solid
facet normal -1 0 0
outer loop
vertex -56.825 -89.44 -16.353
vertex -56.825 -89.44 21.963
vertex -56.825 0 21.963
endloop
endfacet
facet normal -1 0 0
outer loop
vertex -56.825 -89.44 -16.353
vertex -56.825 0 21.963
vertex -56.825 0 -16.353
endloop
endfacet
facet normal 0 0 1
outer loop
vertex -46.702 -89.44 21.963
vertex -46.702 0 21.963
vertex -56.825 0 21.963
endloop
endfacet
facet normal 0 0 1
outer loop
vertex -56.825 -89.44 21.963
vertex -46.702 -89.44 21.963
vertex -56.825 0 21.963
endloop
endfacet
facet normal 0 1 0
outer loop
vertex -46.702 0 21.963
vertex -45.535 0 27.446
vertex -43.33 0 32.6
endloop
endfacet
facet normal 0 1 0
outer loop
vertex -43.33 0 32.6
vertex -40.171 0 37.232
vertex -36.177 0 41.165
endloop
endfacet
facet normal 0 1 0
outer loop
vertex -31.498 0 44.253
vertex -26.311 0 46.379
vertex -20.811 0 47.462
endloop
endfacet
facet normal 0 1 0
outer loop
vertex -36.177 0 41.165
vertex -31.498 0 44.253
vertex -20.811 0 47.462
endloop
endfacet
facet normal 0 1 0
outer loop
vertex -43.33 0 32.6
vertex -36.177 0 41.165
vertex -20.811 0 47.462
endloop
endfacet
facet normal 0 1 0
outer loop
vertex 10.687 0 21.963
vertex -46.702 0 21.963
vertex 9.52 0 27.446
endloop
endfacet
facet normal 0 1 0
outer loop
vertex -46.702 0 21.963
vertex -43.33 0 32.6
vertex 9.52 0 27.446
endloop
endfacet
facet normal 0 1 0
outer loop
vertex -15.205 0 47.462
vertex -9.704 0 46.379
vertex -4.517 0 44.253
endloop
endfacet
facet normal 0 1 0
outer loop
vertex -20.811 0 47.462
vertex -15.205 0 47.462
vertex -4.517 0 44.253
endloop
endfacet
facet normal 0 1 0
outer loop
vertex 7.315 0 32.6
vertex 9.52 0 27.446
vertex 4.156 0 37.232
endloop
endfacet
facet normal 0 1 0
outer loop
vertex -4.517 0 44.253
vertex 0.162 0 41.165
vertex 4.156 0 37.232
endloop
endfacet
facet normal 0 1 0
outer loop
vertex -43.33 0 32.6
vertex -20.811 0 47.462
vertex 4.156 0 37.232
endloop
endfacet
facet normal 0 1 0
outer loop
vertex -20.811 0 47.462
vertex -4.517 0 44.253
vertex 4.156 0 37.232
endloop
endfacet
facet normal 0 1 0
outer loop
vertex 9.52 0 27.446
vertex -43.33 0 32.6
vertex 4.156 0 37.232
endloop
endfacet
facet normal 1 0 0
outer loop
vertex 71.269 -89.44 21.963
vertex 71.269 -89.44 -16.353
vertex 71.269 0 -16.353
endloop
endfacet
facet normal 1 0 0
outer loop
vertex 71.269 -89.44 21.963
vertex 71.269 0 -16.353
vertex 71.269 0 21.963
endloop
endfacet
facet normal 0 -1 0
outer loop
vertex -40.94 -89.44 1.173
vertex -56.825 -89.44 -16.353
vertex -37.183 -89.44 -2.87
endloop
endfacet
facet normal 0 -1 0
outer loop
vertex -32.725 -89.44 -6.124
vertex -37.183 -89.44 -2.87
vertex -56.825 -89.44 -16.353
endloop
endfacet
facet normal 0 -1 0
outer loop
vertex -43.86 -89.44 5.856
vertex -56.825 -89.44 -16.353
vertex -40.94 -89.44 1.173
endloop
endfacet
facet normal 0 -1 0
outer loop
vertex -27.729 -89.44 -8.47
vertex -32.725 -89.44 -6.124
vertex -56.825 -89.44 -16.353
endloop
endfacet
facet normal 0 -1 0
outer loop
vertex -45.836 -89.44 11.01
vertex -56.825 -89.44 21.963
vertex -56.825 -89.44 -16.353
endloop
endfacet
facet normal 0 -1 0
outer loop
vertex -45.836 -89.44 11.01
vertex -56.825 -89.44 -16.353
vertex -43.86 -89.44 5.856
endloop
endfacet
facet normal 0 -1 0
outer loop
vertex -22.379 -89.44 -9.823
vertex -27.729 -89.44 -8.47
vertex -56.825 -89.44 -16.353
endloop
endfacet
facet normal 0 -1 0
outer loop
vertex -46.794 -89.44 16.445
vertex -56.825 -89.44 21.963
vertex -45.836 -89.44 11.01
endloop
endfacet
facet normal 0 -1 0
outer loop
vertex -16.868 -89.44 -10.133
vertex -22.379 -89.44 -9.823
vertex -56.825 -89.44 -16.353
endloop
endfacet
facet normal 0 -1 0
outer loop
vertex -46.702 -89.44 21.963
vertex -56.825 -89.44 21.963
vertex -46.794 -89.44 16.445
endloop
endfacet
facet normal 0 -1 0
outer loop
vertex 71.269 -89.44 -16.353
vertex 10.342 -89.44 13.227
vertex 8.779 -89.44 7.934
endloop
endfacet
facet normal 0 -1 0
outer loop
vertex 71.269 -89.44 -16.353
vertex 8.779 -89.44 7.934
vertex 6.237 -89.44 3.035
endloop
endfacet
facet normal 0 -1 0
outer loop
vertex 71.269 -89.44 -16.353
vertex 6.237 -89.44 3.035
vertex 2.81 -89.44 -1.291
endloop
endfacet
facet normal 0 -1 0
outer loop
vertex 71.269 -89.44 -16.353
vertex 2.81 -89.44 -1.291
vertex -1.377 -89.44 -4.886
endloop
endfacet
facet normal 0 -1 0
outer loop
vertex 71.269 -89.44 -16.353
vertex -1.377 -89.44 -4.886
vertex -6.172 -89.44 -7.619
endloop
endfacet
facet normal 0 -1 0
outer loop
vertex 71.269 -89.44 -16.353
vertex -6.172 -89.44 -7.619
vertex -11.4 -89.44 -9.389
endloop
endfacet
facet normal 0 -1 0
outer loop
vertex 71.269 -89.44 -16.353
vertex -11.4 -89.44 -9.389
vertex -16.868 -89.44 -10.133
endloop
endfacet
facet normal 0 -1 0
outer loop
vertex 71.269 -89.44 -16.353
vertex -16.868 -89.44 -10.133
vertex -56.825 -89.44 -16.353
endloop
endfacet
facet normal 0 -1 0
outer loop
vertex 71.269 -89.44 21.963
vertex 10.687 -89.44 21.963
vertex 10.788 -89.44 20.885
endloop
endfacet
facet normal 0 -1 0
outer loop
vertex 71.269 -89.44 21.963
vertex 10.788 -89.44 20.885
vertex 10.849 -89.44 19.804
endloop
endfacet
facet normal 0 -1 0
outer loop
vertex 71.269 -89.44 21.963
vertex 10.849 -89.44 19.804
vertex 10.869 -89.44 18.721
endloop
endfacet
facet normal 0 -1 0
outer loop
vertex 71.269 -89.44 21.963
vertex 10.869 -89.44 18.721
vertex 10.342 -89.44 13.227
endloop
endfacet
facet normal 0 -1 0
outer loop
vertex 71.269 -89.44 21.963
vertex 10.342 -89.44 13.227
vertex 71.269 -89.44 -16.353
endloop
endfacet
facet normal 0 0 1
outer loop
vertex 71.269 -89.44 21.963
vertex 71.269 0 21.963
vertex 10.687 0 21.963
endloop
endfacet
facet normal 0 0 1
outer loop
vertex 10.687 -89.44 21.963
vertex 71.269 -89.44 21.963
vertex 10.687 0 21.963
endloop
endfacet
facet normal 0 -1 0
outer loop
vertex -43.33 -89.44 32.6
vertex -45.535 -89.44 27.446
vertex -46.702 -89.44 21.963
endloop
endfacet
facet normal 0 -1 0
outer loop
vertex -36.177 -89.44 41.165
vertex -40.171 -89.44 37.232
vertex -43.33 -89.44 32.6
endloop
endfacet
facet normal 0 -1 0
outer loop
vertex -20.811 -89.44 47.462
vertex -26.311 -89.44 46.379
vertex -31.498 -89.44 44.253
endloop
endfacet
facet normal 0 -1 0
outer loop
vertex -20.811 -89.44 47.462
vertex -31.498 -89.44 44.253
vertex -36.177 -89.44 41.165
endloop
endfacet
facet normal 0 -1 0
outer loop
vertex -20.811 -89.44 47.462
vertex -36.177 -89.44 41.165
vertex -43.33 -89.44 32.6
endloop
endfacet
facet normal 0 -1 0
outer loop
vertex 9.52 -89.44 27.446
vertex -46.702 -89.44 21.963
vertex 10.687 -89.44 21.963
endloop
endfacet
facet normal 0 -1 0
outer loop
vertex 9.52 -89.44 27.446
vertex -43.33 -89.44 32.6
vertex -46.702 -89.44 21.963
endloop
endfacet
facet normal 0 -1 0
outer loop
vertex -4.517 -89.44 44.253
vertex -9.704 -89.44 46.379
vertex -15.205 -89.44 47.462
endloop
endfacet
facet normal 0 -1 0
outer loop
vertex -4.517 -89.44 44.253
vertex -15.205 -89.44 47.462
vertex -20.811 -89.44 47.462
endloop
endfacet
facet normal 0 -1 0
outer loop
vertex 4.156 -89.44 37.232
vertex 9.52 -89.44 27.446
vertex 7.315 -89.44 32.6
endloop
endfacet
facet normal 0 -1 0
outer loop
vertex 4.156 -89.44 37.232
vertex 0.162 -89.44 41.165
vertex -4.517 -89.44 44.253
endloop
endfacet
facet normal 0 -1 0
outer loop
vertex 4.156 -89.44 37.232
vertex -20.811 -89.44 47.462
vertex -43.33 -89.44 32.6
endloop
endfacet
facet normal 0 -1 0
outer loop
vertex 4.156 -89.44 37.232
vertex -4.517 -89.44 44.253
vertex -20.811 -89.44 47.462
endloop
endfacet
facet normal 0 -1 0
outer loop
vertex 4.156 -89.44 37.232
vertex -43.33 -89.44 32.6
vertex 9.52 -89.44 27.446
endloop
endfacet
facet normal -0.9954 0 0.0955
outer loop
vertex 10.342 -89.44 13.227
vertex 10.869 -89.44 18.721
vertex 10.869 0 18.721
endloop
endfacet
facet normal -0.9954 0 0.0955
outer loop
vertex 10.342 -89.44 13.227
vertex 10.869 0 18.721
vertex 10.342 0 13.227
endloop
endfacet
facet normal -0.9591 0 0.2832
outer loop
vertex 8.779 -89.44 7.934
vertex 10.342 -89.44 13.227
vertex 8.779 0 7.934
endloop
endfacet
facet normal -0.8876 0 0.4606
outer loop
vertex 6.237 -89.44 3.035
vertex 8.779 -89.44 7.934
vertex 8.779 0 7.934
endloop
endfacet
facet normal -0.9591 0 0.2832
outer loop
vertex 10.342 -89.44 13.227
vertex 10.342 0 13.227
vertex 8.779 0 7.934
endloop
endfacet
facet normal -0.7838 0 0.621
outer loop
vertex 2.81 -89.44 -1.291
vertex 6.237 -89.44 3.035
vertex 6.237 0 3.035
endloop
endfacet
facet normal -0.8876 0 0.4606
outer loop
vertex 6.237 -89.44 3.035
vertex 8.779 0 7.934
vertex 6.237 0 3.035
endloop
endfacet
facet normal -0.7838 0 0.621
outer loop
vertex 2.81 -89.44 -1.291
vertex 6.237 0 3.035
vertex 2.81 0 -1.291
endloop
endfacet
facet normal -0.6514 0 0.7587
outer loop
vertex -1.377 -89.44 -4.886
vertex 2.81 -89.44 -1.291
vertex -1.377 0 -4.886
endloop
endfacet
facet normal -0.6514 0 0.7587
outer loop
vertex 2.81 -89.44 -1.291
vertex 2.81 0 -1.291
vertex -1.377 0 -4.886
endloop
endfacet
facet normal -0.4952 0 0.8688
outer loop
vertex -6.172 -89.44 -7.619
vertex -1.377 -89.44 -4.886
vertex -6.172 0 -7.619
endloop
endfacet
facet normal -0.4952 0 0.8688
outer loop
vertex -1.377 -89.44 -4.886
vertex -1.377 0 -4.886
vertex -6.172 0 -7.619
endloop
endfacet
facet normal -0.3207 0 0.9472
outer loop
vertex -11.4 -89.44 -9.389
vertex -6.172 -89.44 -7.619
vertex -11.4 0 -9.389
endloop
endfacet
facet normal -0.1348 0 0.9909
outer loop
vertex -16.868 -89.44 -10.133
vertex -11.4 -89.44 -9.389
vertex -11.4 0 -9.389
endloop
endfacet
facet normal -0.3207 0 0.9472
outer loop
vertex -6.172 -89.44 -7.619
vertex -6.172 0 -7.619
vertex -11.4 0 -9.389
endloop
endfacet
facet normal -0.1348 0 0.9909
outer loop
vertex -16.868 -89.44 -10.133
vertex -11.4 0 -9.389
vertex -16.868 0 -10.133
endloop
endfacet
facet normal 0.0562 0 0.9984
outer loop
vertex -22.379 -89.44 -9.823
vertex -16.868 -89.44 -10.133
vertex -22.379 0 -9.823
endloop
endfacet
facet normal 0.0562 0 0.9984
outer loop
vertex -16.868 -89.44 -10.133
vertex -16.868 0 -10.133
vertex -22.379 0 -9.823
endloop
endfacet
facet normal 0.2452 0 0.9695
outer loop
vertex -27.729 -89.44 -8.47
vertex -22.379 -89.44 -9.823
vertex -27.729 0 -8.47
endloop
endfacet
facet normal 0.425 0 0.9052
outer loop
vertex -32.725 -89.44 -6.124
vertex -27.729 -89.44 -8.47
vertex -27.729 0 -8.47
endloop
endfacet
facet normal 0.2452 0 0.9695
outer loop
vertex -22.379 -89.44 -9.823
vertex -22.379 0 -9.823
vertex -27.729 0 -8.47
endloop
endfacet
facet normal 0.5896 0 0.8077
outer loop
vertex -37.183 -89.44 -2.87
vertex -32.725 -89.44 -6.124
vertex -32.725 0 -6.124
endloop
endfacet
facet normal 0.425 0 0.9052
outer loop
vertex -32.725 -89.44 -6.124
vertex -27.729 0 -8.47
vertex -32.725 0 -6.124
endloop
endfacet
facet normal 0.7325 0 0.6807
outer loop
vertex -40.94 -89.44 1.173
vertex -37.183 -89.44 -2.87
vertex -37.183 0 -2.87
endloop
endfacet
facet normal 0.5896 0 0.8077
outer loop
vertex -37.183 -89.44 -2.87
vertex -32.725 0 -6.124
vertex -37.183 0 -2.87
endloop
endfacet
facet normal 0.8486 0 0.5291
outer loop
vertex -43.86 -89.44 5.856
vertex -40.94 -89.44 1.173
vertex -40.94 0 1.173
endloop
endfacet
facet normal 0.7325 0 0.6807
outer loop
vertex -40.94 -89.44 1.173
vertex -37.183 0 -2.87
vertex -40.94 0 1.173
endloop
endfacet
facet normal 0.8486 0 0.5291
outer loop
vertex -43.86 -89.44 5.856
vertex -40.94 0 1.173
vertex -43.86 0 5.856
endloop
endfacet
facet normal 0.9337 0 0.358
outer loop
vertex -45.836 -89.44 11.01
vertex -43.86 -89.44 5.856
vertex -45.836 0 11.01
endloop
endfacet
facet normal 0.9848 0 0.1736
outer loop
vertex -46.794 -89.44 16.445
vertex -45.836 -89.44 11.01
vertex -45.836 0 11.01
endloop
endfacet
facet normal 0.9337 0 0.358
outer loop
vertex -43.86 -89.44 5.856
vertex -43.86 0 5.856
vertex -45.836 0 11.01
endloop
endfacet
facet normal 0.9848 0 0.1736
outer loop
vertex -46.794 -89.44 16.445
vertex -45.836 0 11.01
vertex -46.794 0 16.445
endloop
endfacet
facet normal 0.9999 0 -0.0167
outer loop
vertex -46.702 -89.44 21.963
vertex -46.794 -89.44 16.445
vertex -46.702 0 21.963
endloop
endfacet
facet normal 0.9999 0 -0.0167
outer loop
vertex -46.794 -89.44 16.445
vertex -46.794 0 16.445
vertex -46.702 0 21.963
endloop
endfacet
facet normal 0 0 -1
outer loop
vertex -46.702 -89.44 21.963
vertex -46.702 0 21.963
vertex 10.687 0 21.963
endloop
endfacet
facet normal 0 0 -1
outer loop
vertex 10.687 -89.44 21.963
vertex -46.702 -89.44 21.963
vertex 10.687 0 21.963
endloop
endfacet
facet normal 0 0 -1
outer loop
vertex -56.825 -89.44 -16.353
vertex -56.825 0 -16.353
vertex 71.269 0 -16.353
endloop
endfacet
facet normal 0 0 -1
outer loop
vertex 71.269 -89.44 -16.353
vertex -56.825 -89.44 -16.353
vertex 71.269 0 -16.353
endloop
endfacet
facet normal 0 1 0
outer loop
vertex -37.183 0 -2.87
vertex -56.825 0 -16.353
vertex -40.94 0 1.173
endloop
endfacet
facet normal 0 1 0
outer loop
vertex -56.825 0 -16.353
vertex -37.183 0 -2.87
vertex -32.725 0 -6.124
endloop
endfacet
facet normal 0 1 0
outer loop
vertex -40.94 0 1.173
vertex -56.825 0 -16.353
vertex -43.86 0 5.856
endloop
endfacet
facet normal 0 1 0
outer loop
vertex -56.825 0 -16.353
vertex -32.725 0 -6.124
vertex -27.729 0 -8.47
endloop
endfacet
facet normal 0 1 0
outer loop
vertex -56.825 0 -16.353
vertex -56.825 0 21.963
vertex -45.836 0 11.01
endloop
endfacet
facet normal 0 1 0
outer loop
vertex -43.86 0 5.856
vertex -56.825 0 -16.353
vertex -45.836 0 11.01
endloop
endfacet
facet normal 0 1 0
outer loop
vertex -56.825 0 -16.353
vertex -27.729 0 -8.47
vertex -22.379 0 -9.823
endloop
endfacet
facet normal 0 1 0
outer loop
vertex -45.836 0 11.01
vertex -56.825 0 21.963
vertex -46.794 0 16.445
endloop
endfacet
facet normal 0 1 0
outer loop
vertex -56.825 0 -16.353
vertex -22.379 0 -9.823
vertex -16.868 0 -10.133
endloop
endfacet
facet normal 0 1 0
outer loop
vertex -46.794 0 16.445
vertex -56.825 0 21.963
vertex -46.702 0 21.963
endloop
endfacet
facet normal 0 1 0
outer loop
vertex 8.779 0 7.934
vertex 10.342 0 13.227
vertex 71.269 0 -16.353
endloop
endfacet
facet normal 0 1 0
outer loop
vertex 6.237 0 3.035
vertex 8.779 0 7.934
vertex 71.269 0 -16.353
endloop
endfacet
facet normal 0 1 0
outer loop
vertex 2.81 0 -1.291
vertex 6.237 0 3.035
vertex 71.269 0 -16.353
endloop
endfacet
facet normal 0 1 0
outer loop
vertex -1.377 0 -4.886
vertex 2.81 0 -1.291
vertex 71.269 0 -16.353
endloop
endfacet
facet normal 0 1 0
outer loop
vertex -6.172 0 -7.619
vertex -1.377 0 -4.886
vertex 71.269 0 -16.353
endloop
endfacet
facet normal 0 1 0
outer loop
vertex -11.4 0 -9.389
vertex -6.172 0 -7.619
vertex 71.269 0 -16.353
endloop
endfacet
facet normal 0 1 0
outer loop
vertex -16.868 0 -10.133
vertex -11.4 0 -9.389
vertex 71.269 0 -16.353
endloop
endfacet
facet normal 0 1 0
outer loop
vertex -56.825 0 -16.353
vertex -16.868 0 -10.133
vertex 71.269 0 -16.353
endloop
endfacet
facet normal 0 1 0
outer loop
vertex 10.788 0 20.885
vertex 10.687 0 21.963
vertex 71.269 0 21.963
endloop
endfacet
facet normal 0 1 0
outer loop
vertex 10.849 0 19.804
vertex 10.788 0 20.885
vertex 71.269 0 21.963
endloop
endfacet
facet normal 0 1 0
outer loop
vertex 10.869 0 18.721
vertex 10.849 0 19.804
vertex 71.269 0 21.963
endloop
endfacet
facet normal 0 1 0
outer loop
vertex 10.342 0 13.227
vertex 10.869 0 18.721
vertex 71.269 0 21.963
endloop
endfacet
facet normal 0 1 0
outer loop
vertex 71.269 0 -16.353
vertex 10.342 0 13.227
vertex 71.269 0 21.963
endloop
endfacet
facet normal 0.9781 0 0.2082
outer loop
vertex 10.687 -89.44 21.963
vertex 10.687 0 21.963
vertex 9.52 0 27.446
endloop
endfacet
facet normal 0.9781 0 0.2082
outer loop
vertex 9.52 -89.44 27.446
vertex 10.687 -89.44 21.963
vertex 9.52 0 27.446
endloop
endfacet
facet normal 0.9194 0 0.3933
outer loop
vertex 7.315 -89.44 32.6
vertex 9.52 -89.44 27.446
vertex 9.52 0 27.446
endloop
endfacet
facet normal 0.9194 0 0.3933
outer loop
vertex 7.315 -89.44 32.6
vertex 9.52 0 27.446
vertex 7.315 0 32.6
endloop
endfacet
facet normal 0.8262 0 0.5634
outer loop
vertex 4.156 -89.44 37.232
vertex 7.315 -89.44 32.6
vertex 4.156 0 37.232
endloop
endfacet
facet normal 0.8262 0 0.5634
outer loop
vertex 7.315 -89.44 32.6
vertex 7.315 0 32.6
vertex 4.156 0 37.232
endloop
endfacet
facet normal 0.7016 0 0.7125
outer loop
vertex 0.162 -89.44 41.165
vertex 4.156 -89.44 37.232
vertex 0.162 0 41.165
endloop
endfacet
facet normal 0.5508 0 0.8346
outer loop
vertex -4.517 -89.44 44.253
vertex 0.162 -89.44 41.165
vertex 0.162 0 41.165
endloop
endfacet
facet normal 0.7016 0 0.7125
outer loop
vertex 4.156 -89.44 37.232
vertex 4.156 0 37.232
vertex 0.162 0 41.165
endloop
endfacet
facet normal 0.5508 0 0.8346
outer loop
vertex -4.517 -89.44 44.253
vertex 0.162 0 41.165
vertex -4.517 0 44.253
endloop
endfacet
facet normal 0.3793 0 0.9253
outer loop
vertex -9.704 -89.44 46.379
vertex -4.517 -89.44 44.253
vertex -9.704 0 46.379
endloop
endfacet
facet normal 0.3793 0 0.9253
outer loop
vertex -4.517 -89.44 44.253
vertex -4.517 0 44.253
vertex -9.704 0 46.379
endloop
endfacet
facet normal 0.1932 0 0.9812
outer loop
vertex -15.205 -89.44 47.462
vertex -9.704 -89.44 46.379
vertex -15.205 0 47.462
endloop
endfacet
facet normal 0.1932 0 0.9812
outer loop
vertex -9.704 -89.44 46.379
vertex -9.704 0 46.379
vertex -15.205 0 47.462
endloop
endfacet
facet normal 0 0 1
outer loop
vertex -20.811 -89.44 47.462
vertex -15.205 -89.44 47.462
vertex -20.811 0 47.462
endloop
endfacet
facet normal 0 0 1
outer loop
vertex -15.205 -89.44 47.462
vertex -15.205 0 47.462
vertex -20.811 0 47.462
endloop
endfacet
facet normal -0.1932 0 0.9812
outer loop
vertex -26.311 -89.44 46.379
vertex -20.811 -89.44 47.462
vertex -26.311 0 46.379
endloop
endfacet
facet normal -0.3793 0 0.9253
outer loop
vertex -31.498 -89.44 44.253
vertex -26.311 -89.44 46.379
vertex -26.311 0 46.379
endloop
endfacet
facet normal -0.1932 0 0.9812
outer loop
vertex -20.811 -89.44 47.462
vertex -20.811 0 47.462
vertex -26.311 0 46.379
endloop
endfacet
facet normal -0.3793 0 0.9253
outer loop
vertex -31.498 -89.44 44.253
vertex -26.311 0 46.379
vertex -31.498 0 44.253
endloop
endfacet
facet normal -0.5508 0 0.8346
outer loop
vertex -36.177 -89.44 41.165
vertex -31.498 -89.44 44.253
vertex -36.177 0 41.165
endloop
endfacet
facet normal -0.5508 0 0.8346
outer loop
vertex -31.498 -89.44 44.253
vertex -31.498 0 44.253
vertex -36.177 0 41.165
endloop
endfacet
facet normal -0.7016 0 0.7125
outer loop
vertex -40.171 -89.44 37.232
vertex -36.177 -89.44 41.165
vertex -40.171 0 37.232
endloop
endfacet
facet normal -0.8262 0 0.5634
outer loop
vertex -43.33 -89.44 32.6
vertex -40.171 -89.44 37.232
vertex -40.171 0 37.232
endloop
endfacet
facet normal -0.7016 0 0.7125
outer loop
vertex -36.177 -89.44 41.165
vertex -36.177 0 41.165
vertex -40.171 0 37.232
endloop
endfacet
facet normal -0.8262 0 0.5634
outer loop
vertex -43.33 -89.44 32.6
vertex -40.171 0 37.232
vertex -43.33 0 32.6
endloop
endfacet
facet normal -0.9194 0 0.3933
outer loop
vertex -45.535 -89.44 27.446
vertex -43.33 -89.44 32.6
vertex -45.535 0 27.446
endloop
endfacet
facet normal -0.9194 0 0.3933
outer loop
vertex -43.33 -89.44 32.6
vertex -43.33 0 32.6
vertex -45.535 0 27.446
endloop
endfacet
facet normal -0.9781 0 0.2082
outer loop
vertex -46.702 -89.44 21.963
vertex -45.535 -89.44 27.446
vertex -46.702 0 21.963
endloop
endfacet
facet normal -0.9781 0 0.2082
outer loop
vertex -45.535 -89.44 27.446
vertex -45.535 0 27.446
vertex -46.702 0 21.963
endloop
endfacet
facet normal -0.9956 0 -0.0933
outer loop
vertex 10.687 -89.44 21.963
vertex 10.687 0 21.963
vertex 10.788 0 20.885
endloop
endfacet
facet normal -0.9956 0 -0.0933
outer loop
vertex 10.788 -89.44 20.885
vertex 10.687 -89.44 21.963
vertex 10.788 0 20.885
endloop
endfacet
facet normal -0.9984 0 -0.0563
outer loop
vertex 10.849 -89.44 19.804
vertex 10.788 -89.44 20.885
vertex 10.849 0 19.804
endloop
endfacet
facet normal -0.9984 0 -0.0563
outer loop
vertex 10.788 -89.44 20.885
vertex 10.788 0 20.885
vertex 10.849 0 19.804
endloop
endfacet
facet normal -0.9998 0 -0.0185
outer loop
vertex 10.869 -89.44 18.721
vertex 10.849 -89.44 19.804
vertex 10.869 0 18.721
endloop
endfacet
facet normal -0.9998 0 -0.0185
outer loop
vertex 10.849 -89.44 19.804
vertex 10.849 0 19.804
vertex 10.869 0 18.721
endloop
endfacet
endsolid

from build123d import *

# Parameters (mm, degrees)
F1_DEPTH = 89.439973


with BuildPart() as f1:
    # F0 (on Front) → F1 (new body)
    with BuildSketch(Plane.XZ):
        with BuildLine():
            ThreePointArc((10.68671, 21.963043), (10.823579, 20.344732), (10.86925, 18.721286))
            ThreePointArc((10.86925, 18.721286), (-19.630985, -10.109832), (-46.701788, 21.963043))
            Line((-46.701788, 21.963043), (-56.824684, 21.963043))
            Line((-56.824684, 21.963043), (-56.824684, -16.352577))
            Line((-56.824684, -16.352577), (71.268879, -16.352577))
            Line((71.268879, -16.352577), (71.268879, 21.963043))
            Line((71.268879, 21.963043), (10.68671, 21.963043))
        make_face()
        with BuildLine():
            Line((-46.701788, 21.963043), (10.68671, 21.963043))
            ThreePointArc((10.68671, 21.963043), (-18.007539, 47.598075), (-46.701788, 21.963043))
        make_face()
    extrude(amount=F1_DEPTH)


solid = f1.part
